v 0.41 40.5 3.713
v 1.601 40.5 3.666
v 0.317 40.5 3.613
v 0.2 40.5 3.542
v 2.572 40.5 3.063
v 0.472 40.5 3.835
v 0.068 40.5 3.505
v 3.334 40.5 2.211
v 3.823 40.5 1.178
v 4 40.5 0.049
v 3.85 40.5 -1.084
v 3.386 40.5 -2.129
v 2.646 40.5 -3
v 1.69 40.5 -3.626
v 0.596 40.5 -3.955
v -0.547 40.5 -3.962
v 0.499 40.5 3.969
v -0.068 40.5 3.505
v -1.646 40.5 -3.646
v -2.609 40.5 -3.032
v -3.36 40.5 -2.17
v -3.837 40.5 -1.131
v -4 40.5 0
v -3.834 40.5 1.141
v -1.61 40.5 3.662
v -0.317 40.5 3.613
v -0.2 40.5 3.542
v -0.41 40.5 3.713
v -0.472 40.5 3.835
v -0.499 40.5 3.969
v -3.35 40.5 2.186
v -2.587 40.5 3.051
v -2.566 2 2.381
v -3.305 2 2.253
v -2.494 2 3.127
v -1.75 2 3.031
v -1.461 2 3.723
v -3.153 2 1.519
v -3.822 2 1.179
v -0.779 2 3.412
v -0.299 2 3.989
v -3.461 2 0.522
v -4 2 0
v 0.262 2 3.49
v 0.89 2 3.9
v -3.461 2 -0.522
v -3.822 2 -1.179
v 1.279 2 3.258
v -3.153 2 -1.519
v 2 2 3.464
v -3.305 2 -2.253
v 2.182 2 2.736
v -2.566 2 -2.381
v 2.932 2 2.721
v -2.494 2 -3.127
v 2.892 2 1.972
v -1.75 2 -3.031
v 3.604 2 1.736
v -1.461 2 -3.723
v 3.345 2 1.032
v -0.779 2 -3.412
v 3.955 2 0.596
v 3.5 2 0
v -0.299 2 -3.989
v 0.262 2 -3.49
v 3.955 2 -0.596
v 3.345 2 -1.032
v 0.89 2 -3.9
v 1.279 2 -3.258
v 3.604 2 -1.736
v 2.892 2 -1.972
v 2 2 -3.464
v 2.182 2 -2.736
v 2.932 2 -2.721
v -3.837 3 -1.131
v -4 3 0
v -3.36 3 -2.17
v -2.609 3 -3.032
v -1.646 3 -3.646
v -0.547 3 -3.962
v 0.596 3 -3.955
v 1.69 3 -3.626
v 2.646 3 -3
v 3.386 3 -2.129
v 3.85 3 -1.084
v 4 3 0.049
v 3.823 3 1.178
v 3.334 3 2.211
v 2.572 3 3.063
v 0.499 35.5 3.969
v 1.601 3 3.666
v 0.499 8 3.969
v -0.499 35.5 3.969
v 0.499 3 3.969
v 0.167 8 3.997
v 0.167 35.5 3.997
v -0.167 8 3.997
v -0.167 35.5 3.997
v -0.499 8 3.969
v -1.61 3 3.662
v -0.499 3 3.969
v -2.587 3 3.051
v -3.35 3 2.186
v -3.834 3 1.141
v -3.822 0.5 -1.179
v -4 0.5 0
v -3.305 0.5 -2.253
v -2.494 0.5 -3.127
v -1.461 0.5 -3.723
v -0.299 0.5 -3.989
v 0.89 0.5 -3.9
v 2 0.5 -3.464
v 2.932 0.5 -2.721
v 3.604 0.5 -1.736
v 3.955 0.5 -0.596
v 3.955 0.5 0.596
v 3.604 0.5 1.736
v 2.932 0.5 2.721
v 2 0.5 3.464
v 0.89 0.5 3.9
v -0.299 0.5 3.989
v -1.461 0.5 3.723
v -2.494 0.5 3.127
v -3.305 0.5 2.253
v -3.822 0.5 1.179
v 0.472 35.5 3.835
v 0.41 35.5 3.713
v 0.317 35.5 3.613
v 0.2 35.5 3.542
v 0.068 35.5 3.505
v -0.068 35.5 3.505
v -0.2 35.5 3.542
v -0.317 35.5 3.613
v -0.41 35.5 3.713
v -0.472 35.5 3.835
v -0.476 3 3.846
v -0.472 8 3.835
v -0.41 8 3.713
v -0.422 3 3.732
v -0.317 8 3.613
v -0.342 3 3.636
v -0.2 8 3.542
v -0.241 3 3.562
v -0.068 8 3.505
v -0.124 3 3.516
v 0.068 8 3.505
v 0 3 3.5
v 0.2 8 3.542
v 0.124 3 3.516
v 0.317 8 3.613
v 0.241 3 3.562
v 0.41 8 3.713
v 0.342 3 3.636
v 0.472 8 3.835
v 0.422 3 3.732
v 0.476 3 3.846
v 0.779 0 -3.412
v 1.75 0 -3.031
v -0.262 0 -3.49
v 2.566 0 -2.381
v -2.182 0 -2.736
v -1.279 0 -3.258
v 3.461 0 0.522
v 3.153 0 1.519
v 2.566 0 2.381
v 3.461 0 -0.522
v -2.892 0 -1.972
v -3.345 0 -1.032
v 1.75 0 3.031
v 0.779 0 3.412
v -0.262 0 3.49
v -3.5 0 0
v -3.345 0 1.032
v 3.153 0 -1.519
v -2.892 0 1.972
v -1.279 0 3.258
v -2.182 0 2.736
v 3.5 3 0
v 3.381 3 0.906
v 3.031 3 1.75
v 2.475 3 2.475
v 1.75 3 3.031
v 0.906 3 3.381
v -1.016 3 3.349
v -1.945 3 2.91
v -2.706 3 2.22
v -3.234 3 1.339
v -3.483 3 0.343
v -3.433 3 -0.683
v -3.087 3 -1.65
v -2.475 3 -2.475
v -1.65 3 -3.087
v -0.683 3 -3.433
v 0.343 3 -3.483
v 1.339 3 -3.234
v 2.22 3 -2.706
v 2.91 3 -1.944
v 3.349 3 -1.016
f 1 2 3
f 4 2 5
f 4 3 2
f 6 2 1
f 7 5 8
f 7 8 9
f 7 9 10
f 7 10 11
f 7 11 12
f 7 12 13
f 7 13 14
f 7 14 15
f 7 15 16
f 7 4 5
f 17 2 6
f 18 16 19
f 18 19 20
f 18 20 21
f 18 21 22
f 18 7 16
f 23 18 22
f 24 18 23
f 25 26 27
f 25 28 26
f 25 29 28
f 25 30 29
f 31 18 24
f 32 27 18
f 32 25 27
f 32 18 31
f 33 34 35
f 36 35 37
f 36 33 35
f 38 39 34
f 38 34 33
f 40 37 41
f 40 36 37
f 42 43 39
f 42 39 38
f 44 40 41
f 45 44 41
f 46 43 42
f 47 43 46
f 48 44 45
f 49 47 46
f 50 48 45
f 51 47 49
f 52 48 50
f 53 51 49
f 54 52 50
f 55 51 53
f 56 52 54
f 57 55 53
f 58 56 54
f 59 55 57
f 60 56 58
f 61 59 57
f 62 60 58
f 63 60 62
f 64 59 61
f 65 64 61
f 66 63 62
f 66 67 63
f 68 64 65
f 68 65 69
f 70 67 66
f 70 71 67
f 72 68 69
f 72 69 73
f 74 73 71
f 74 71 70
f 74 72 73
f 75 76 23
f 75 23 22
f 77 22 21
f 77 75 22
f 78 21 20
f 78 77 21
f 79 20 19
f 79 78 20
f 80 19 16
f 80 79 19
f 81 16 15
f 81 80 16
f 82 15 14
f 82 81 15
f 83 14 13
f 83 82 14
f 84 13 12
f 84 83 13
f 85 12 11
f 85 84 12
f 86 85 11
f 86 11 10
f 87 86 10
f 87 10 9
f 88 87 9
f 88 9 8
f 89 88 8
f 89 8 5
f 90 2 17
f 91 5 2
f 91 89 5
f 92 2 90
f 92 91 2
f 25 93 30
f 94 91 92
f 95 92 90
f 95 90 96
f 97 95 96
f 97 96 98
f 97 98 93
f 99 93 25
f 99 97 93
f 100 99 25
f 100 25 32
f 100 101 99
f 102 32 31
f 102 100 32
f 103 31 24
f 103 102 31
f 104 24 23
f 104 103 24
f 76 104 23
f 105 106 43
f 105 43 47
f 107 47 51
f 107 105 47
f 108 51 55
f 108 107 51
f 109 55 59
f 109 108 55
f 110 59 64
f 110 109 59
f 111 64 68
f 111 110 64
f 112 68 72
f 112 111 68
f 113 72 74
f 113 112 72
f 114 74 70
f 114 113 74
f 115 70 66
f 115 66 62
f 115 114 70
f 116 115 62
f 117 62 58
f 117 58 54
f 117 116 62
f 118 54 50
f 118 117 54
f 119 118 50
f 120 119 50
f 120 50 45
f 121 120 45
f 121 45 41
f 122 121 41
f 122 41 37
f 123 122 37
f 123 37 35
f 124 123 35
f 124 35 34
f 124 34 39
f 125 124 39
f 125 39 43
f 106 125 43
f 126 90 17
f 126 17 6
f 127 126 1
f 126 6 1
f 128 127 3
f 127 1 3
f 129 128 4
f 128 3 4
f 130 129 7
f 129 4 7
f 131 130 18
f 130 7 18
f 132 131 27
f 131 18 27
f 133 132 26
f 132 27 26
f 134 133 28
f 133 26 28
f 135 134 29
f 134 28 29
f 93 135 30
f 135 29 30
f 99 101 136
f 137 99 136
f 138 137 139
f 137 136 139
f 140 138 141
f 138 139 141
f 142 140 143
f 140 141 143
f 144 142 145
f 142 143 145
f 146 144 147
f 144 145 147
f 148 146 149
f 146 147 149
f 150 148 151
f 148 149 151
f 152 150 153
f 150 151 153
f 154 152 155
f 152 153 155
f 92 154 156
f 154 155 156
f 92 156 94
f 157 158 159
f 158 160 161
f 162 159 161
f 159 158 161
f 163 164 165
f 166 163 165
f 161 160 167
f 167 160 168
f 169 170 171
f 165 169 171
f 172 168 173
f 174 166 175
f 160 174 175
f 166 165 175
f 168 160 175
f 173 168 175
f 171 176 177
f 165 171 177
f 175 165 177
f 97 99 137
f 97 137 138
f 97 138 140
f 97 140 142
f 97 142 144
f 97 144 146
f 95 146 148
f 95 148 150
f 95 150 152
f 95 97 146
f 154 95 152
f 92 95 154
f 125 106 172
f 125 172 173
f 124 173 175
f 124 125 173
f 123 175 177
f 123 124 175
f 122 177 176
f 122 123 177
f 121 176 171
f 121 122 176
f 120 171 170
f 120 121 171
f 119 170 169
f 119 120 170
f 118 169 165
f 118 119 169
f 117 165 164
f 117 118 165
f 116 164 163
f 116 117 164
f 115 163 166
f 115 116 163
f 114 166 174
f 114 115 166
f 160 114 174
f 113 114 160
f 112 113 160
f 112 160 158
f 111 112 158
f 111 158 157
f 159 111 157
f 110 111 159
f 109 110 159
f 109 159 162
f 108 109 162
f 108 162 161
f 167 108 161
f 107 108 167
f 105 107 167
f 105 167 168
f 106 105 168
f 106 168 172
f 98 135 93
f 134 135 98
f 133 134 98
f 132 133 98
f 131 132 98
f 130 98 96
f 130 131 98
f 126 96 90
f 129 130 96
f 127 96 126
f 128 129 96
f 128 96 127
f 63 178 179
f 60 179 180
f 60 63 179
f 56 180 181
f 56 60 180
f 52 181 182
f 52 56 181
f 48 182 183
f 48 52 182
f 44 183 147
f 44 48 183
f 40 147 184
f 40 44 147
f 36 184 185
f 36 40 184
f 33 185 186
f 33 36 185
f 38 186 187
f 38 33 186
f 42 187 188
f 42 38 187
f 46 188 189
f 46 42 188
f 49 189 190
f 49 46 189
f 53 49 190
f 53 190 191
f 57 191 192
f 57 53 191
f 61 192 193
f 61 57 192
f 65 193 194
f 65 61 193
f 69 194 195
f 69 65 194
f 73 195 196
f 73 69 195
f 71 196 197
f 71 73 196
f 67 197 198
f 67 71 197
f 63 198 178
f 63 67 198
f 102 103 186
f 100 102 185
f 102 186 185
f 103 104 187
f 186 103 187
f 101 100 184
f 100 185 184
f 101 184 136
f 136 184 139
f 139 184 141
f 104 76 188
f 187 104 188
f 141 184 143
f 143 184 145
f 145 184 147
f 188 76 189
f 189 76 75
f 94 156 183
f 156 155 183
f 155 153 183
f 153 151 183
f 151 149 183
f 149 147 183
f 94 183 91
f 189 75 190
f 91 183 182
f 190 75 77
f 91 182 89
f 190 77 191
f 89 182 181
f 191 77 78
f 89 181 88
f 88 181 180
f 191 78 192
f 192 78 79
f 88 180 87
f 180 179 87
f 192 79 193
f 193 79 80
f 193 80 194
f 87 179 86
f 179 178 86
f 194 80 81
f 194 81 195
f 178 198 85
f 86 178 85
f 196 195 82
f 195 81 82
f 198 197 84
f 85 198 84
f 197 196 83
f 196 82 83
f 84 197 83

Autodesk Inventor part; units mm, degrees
ref_plane "YZ Plane" through (0, 0, 0) normal (1, 0, 0) x (0, 1, 0)
ref_plane "XZ Plane" through (0, 0, 0) normal (0, 1, 0) x (-1, 0, 0)
ref_plane "XY Plane" through (0, 0, 0) normal (0, 0, 1) x (1, 0, 0)
sketch "Sketch1" plane through (0, 0, 0) normal (0, 1, 0) x (-1, 0, 0)
  circle A0 centre (0, 0) radius 4
  dimension "d0" = 8
extrude "Extrusion1" add sketch "Sketch1" along normal blind 40.5
chamfer "Chamfer1" distance 0.5 angle 45 1 edges at (4, 0, 0)
sketch "Sketch2" plane through (0, 0, 0) normal (0, 0, 1) x (1, 0, 0)
  line L0 (-4, 0.5) -> (-4, 40.5) construction
  line L1 (-3.5, 0) -> (-4, 0.5) construction
  line L2 (-4, 0.5) -> (4, 0.5) construction
  line L3 (3.5, 0) -> (-3.5, 0) construction
  line L4 (4, 40.5) -> (-4, 40.5) projected
  line L5 (-4, 0.5) -> (4, 0.5) construction
  line L6 (3.5, 0) -> (4, 0.5) construction
  line L7 (4, 0.5) -> (4, 40.5) construction
  line L8 (4, 3) -> (3.5, 3)
  line L9 (3.5, 3) -> (3.5, 2)
  line L10 (3.5, 2) -> (4, 2)
  line L11 (4, 2) -> (4, 3)
  line L12 (0, -7.9) -> (0, 47.4) projected
  point P0 (0, 0)
  dimension "d6" = 2
  dimension "d7" = 1
  dimension "d8" = 0.5
revolve "Revolution1" cut sketch "Sketch2" angle 360 about axis through (0, -10, 0) along (0, 1, 0)
sketch "Sketch6" plane through (0, 3, 0) normal (0, -1, 0) x (1, 0, 0)
  circle A0 centre (0, 0) radius 3.5 construction
  circle A1 centre (0, 0) radius 4 construction
  circle A2 centre (0, 0) radius 4 projected
  circle A3 centre (0, 4) radius 0.5
extrude "Extrusion4" cut sketch "Sketch6" against normal blind 5 contours A3 A2 | A2 A3 picked at (0.0193, 3.8321) picked at (0.0153, 4.1636)
sketch "Sketch7" plane through (0, 40.5, 0) normal (0, 1, 0) x (1, 0, 0)
  arc A0 (0.499, -3.9688) -> (-0.499, -3.9688) centre (0, -4) ccw projected
  circle A1 centre (0, -4) radius 0.5
  point P0 (0, 0)
  point P1 (-0.499, -3.9688)
  point P2 (0.499, -3.9688)
extrude "Extrusion5" cut sketch "Sketch7" against normal blind 5
properties part number "Trục"
